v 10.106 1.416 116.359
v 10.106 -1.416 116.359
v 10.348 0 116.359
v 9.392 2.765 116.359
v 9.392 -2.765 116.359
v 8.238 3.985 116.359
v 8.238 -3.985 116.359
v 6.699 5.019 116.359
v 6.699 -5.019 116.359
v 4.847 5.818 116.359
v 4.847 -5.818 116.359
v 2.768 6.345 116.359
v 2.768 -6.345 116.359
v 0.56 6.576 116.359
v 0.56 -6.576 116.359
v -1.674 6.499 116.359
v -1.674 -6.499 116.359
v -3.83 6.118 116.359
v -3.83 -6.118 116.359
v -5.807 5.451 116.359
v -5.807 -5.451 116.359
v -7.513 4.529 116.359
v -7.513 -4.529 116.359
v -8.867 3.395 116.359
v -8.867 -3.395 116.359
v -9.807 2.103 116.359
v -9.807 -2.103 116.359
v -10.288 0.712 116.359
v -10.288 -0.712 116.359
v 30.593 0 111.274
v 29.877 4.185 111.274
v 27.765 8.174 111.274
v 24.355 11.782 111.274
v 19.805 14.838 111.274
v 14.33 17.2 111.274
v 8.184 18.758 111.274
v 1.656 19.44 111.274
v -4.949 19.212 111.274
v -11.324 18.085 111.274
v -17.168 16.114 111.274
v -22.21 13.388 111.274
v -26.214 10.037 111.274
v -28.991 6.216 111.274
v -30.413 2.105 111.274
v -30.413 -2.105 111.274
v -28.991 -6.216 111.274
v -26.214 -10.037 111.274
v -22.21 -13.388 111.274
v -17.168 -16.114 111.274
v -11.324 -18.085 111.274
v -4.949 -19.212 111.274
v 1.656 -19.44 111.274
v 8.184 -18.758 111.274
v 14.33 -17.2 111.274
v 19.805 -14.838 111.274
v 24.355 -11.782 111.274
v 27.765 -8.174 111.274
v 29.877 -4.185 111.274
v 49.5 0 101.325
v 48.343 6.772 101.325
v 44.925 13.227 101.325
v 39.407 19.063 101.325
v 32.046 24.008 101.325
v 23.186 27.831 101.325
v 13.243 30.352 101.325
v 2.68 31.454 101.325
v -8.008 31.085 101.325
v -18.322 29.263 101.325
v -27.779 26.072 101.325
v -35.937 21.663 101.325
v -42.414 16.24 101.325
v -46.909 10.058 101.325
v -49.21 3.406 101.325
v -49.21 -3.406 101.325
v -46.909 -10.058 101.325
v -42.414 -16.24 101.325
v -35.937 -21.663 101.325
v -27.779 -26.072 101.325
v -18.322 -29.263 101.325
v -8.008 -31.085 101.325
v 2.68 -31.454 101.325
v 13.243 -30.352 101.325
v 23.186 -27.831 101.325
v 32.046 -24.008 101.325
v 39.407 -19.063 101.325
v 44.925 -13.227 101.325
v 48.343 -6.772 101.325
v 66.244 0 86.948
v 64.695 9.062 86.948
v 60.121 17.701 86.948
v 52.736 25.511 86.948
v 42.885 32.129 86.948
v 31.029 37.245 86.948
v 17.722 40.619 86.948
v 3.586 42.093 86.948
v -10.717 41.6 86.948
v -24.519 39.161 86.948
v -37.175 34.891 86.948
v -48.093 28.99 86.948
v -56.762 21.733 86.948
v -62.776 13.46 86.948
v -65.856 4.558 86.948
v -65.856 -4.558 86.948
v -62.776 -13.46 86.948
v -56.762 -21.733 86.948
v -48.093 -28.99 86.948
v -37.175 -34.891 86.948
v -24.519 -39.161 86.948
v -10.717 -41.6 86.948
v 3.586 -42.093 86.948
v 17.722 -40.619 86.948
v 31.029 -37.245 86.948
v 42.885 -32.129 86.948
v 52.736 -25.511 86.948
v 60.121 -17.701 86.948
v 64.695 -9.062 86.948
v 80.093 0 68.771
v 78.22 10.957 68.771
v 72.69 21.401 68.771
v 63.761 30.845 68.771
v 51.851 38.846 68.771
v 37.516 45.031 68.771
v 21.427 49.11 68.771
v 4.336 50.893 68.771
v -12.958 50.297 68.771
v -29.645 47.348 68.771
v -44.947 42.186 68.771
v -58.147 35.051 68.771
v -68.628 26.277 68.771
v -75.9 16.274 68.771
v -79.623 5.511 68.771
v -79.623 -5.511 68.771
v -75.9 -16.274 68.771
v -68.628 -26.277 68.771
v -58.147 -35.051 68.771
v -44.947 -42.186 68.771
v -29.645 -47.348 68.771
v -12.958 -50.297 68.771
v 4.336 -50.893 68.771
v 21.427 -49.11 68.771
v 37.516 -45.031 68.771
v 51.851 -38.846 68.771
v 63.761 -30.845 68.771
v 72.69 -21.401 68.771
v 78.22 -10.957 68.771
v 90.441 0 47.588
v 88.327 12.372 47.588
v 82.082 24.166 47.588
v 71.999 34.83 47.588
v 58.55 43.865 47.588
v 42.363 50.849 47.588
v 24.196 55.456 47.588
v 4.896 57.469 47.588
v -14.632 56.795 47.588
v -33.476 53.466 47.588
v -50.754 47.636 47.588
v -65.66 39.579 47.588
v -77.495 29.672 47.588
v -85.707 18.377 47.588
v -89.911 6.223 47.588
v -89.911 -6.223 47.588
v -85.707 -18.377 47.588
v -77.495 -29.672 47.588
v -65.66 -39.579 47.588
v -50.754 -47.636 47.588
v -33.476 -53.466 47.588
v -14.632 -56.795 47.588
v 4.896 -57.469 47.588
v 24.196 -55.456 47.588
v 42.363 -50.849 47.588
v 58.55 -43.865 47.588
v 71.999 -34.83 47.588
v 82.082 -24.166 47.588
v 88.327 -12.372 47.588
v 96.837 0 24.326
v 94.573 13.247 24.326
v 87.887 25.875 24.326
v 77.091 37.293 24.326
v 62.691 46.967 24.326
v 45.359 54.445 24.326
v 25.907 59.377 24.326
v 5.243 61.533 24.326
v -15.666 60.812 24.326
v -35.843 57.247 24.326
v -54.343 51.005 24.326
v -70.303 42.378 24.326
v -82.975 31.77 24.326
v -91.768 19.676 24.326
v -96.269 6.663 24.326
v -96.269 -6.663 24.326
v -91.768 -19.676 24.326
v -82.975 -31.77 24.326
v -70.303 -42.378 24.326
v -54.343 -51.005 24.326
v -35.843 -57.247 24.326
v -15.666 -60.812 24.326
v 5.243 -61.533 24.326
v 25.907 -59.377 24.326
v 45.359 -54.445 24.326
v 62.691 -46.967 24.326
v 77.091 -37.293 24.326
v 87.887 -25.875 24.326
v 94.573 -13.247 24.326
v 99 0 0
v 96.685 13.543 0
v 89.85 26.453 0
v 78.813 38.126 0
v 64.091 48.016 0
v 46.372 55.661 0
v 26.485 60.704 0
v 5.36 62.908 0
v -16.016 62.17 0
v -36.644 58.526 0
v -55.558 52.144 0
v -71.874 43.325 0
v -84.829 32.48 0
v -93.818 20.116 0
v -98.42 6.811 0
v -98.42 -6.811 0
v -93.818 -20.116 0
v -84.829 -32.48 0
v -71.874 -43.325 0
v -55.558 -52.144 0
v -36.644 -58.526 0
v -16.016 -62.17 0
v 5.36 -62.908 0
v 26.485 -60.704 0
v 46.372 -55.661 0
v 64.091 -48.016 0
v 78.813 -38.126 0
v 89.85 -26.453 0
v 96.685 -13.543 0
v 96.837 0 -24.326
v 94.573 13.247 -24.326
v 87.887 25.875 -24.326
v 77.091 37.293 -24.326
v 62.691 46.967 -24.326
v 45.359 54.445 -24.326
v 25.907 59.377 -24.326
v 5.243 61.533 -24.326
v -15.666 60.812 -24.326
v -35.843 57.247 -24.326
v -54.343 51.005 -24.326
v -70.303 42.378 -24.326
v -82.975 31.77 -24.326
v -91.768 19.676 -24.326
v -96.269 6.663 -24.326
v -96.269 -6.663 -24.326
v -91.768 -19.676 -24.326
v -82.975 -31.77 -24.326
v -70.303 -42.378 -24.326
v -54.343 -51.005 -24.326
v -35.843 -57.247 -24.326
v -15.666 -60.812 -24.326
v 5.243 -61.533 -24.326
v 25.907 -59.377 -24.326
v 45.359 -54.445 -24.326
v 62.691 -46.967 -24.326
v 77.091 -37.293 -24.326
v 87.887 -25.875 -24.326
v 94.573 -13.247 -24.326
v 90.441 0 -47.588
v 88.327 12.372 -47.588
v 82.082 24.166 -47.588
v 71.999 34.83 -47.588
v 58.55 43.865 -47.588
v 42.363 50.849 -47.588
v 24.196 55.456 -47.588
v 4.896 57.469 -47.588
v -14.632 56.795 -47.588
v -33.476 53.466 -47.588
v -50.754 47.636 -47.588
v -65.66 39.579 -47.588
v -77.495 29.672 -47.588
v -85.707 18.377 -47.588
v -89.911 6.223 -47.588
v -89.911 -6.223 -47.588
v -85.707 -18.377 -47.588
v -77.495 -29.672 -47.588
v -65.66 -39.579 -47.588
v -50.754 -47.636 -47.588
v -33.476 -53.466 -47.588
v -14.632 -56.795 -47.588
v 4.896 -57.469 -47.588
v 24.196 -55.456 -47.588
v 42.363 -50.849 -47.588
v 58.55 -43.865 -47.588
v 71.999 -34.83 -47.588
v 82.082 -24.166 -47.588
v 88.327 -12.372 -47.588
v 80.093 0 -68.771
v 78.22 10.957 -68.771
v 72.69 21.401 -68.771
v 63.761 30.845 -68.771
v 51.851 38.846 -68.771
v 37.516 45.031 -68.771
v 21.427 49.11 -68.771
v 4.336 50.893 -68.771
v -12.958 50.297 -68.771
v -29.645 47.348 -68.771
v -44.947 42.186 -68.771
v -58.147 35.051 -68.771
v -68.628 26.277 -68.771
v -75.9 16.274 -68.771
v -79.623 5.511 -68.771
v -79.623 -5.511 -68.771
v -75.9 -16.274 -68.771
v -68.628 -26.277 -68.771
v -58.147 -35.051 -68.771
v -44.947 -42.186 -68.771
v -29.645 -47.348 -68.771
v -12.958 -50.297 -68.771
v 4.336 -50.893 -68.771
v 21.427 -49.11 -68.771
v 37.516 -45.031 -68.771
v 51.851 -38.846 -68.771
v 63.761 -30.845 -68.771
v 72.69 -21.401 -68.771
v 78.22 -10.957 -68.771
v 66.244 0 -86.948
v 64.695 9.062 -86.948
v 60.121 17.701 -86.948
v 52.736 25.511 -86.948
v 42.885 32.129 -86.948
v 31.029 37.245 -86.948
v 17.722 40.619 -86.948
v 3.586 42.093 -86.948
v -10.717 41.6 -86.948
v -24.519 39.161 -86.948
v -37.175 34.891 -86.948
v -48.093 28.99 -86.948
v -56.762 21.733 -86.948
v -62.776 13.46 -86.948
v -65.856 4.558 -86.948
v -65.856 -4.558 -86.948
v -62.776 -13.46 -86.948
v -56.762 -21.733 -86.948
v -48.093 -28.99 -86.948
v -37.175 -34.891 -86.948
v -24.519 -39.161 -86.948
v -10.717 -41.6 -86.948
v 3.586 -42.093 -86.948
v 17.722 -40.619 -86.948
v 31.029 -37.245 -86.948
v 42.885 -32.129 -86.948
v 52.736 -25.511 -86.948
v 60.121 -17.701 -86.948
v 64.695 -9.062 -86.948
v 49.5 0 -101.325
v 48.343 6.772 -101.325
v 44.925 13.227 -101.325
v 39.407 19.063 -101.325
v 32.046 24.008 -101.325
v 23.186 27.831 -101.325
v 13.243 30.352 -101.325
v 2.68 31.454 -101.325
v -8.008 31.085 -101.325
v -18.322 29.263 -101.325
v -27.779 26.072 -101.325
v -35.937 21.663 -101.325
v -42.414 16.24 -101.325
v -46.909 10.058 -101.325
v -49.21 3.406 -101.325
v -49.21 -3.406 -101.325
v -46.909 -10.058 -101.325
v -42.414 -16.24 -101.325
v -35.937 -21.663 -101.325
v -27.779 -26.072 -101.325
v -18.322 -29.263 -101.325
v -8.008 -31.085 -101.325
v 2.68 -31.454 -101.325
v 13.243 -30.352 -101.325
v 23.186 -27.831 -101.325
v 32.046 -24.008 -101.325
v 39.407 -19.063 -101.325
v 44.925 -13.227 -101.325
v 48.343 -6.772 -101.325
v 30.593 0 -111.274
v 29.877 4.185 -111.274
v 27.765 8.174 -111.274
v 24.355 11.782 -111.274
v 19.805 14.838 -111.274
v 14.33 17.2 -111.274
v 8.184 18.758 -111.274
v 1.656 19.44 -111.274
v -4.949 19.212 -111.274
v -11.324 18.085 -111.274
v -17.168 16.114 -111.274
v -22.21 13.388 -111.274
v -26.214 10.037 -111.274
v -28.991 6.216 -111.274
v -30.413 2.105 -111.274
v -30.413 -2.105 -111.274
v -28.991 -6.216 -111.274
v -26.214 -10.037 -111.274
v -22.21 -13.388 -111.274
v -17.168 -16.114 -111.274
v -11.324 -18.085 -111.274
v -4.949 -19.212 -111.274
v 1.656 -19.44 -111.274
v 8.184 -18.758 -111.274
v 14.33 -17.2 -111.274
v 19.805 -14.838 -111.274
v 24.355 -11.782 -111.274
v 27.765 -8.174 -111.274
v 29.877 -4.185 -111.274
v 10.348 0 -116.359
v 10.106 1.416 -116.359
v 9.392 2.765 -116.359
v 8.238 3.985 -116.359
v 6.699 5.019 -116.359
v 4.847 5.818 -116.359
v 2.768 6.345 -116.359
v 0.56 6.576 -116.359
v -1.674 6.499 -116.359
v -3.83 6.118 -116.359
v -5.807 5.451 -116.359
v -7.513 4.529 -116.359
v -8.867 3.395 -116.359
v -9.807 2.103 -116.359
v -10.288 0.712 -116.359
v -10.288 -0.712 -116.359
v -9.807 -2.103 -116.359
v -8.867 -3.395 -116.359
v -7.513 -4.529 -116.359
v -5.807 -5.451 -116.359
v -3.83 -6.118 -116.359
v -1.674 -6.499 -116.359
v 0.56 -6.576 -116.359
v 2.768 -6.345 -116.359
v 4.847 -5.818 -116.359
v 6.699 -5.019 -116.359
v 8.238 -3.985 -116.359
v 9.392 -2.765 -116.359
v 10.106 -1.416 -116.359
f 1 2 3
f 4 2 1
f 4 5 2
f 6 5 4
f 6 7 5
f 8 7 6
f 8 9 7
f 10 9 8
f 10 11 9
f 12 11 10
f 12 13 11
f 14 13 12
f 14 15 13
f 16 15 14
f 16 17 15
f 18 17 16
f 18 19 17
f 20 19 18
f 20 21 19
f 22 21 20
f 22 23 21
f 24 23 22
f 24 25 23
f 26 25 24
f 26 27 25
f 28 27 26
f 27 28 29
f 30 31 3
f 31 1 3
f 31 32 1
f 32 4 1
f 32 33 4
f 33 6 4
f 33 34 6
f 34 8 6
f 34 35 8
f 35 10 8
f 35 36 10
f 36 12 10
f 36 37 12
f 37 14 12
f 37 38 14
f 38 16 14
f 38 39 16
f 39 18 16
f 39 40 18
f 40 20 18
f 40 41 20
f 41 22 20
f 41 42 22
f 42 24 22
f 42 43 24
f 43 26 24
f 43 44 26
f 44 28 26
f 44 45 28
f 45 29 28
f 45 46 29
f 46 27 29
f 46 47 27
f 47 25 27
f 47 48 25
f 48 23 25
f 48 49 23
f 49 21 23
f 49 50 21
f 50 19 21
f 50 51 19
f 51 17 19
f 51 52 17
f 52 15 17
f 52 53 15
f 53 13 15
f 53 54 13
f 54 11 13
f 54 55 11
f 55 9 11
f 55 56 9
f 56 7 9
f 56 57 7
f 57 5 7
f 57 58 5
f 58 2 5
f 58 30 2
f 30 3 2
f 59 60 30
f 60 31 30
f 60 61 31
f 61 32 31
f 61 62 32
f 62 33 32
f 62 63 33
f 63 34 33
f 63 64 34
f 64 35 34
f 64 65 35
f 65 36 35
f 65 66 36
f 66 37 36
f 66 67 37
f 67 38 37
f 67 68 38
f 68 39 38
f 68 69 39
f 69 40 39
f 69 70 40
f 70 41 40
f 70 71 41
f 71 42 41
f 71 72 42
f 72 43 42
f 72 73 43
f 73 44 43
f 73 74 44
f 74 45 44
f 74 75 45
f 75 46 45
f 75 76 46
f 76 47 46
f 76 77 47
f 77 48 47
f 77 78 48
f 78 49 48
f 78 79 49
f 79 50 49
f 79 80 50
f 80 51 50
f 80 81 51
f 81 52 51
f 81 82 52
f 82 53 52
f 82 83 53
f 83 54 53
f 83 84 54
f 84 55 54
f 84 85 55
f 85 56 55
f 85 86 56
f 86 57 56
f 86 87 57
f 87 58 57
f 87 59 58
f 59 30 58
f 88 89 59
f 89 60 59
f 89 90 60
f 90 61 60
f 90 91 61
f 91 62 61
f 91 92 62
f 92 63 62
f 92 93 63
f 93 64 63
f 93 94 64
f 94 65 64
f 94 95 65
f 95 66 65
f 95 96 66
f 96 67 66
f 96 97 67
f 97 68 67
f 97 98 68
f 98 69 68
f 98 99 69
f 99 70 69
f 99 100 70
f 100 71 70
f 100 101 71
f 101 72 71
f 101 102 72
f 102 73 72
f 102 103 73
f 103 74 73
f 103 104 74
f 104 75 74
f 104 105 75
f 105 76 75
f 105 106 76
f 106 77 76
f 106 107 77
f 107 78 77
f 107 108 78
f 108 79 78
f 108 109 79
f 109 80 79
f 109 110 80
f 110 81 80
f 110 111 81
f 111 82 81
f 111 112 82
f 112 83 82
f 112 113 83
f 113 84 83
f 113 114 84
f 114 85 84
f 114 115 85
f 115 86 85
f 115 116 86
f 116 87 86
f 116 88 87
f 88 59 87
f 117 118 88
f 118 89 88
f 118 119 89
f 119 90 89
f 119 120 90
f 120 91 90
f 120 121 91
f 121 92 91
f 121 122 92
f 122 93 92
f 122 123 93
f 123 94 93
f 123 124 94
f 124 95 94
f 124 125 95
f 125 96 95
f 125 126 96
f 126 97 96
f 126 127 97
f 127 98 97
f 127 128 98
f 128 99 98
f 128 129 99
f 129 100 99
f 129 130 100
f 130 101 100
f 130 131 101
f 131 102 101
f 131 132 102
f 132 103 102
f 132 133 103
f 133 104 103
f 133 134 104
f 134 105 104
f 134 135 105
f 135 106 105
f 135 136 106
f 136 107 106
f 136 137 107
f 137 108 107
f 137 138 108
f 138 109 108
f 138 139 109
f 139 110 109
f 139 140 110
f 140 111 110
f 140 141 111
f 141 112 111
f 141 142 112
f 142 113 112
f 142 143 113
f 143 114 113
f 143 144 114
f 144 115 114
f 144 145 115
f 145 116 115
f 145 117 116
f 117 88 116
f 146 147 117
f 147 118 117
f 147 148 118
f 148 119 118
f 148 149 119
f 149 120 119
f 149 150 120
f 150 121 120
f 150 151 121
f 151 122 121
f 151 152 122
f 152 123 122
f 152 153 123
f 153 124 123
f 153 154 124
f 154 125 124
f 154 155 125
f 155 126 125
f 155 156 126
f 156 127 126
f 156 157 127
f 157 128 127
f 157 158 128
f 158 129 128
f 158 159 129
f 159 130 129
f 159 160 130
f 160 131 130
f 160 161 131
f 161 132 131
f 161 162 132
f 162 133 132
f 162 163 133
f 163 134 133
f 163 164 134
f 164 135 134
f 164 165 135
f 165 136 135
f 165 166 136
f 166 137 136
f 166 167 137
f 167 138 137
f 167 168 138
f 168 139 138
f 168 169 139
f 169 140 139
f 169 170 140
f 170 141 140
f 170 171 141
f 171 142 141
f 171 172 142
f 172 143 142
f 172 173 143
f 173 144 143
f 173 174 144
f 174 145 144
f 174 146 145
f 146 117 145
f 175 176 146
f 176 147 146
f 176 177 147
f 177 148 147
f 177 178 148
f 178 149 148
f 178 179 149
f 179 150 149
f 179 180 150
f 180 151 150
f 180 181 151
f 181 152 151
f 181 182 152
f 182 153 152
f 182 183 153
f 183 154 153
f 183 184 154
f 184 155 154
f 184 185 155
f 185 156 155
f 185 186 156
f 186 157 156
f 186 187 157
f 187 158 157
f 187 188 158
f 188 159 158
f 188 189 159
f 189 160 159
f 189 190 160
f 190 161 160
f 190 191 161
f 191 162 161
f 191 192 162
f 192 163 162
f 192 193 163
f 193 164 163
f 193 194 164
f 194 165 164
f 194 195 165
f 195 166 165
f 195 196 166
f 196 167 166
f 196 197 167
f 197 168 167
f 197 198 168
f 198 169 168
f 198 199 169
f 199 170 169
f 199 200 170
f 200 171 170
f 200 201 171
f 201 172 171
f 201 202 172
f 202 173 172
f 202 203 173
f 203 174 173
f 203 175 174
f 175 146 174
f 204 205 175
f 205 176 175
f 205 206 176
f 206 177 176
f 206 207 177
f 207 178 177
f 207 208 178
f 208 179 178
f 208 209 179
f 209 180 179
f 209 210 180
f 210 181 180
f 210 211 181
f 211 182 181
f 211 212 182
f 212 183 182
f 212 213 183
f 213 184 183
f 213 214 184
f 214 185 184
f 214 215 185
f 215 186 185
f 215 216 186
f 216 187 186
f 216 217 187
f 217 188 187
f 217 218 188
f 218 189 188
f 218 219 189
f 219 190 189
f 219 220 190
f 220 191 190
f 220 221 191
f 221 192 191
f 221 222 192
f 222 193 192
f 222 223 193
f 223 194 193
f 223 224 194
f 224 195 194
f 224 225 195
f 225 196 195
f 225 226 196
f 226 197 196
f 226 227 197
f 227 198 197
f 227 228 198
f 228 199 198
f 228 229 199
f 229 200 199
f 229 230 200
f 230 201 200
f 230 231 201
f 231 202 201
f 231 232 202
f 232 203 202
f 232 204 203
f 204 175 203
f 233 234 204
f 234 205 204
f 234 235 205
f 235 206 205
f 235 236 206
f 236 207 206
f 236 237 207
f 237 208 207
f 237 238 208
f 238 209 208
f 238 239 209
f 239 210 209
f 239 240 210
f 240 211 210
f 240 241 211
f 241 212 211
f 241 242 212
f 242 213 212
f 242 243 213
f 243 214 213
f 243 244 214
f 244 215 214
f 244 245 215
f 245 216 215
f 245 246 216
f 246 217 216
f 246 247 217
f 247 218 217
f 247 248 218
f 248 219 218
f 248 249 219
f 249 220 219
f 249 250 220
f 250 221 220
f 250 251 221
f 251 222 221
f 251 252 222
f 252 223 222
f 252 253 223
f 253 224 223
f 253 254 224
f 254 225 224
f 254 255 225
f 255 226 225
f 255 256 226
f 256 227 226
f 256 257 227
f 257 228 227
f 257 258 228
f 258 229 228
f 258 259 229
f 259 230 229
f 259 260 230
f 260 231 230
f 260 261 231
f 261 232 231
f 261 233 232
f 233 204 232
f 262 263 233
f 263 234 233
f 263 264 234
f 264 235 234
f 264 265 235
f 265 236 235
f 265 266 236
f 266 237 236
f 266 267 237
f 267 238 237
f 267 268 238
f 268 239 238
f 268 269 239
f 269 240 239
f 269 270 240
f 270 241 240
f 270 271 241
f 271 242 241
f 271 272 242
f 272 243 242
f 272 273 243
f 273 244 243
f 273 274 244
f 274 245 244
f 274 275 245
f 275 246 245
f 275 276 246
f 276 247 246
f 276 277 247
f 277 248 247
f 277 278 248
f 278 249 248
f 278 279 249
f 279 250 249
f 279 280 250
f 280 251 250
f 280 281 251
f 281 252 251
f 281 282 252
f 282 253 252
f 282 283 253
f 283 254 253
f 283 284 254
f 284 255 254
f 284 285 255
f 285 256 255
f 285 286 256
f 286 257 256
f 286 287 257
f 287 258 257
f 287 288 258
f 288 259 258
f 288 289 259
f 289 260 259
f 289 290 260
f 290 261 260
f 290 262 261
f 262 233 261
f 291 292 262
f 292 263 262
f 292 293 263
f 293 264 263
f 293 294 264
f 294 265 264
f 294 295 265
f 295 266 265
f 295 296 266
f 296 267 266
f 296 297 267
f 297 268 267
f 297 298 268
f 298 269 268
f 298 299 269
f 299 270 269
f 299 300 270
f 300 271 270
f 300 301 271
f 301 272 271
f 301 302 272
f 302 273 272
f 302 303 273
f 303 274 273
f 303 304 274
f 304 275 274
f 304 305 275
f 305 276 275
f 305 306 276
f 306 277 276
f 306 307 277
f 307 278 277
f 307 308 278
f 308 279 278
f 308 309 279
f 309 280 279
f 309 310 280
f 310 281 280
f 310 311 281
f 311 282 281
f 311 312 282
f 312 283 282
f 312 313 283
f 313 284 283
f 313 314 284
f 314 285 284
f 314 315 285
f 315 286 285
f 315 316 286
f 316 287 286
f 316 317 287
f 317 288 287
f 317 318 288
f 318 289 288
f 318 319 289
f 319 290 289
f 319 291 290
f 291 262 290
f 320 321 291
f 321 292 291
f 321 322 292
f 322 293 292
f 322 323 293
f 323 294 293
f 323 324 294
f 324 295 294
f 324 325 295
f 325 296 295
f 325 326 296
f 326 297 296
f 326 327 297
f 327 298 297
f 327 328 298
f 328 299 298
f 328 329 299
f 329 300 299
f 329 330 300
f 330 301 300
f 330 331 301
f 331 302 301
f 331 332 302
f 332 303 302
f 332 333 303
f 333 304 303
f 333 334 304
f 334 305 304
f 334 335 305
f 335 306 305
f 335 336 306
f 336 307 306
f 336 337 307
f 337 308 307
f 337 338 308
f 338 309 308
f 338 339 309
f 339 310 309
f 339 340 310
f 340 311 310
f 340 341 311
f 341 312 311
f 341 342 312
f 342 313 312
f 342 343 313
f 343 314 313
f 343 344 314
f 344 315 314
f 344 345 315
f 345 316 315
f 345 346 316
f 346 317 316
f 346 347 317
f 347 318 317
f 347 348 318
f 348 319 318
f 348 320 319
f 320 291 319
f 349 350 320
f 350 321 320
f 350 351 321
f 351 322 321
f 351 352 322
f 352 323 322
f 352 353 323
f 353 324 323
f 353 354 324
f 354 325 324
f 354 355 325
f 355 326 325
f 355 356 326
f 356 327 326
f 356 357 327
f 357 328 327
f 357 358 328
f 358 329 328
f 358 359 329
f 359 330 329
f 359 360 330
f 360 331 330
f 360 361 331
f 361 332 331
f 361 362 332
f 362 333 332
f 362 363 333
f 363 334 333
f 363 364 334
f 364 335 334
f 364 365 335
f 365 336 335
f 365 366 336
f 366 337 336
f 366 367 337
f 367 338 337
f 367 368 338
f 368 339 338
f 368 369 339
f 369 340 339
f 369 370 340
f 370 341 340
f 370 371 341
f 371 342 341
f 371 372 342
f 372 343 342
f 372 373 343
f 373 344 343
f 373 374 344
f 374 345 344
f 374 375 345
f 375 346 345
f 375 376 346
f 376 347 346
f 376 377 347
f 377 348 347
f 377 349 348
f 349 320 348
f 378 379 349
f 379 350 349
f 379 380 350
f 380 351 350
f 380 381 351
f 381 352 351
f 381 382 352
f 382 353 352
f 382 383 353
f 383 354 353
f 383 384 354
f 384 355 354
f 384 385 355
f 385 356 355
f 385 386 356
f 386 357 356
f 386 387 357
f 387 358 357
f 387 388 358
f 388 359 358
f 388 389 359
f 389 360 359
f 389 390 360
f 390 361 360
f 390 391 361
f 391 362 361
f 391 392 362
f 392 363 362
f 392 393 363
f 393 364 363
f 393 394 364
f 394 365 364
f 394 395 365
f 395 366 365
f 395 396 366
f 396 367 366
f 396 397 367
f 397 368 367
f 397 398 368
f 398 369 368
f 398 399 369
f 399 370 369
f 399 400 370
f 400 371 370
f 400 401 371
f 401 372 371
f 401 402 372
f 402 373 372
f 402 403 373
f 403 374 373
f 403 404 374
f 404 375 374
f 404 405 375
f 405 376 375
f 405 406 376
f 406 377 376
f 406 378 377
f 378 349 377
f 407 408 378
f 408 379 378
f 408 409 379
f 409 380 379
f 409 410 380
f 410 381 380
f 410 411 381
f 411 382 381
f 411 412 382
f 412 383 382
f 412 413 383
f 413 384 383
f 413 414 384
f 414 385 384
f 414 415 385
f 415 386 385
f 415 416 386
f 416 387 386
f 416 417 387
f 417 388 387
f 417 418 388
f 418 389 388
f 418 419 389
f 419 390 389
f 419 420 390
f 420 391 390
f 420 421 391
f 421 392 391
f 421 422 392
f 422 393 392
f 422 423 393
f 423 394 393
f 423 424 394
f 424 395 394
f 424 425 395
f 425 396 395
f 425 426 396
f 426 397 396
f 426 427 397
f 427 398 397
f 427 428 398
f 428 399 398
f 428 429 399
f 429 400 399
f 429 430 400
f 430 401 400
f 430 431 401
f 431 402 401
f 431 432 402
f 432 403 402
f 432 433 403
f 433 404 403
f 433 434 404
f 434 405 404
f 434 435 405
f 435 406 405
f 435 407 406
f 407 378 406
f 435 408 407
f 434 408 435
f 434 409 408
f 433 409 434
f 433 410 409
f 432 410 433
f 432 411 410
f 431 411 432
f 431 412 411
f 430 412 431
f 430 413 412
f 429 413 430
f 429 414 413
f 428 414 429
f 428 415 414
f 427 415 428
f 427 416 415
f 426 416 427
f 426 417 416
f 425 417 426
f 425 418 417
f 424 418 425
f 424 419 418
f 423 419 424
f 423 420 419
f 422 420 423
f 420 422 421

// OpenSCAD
// Generated by SolidPython 1.0.1 on 2020-07-29 00:46:49


scale(v = [11, 7, 13]) {
	sphere(r = 9);
}
/***********************************************
*********      SolidPython code:      **********
************************************************
 
# import packages: SolidPython
from solid import *
from solid.utils import *
from itertools import chain, combinations, permutations


class Resize:

    def __init__(self, scad_file):
        self.scad_file = scad_file
        #self.scad_file = import_scad(scad_file)
        # cone/cylinder param:
        self.r1 = 0
        self.r2 = 0
        self.h = 0
        # rectangular prism param:
        self.w = 0
        self.l = 0
        # ellipse param:
        self.r = 0

    # import OpenScad code (file name corresponds to shape)


    # classify shape + parameters
    def assign(self, param1, param2, param3):
        if self.scad_file == 'cone.scad':
            self.r1 = param1
            self.r2 = param2
            self.h = param3
        elif self.scad_file == 'cylinder.scad':
            self.r1 = param1
            self.r2 = param2
            self.h = param3
        elif self.scad_file == 'rectangularPrism.scad':
            self.h = param1
            self.l = param2
            self.w = param3
        else:
            self.r = param1
            self.h = param2

    # resize parameters
    def iterate(self):
        x = range(3, 20, 2)
        i = 1
        if self.scad_file == 'cone.scad':
            tempList = list(permutations(x, 2))
            for temp in tempList:
                param1 = temp[0]
                param2 = temp[1]
                filepath = 'produced_scad_files/' + 'cone' + str(param1) + '_' + str(param2) + '_' + '.scad'
                scad_render_to_file(cylinder(h=param1, r1=param2, r2=0), filepath)

        elif self.scad_file == 'cylinder.scad':
            tempList = list(permutations(x, 3))
            for temp in tempList:
                param1 = temp[0]
                param2 = temp[1]
                filepath = 'produced_scad_files/' + 'cylinder' + str(param1) + '_' + str(param2) + '_' + '.scad'
                scad_render_to_file(cylinder(h=param1, r1=param2, r2=param2), filepath)

        elif self.scad_file == 'rectangularPrism.scad':
            tempList = list(permutations(x, 3))
            for temp in tempList:
                param1 = temp[0]
                param2 = temp[1]
                param3 = temp[2]
                filepath = 'produced_scad_files/' + 'rectangularPrism' + str(param1) + '_' + str(param2) + '_' + str(
                    param3) + '.scad'
                scad_render_to_file(cube(size=(param1, param2, param3)), filepath)

        elif self.scad_file == 'ellipse.scad':
            tempList = list(permutations(x, 4))
            for temp in tempList:
                param1 = temp[0]
                param2 = temp[1]
                param3 = temp[2]
                param4 = temp[3]
                filepath = 'produced_scad_files/' + 'ellipse' + str(param1) + '_' + str(param2) + '_' + str(param3) + '_' + str(param4) + '.scad'
                scad_render_to_file(scale([param1, param2, param3])(sphere(r=param4)), filepath)

    def render_to_scadfile(self):
        scad_render_to_file(scad, 'example.scad') 
 
************************************************/
